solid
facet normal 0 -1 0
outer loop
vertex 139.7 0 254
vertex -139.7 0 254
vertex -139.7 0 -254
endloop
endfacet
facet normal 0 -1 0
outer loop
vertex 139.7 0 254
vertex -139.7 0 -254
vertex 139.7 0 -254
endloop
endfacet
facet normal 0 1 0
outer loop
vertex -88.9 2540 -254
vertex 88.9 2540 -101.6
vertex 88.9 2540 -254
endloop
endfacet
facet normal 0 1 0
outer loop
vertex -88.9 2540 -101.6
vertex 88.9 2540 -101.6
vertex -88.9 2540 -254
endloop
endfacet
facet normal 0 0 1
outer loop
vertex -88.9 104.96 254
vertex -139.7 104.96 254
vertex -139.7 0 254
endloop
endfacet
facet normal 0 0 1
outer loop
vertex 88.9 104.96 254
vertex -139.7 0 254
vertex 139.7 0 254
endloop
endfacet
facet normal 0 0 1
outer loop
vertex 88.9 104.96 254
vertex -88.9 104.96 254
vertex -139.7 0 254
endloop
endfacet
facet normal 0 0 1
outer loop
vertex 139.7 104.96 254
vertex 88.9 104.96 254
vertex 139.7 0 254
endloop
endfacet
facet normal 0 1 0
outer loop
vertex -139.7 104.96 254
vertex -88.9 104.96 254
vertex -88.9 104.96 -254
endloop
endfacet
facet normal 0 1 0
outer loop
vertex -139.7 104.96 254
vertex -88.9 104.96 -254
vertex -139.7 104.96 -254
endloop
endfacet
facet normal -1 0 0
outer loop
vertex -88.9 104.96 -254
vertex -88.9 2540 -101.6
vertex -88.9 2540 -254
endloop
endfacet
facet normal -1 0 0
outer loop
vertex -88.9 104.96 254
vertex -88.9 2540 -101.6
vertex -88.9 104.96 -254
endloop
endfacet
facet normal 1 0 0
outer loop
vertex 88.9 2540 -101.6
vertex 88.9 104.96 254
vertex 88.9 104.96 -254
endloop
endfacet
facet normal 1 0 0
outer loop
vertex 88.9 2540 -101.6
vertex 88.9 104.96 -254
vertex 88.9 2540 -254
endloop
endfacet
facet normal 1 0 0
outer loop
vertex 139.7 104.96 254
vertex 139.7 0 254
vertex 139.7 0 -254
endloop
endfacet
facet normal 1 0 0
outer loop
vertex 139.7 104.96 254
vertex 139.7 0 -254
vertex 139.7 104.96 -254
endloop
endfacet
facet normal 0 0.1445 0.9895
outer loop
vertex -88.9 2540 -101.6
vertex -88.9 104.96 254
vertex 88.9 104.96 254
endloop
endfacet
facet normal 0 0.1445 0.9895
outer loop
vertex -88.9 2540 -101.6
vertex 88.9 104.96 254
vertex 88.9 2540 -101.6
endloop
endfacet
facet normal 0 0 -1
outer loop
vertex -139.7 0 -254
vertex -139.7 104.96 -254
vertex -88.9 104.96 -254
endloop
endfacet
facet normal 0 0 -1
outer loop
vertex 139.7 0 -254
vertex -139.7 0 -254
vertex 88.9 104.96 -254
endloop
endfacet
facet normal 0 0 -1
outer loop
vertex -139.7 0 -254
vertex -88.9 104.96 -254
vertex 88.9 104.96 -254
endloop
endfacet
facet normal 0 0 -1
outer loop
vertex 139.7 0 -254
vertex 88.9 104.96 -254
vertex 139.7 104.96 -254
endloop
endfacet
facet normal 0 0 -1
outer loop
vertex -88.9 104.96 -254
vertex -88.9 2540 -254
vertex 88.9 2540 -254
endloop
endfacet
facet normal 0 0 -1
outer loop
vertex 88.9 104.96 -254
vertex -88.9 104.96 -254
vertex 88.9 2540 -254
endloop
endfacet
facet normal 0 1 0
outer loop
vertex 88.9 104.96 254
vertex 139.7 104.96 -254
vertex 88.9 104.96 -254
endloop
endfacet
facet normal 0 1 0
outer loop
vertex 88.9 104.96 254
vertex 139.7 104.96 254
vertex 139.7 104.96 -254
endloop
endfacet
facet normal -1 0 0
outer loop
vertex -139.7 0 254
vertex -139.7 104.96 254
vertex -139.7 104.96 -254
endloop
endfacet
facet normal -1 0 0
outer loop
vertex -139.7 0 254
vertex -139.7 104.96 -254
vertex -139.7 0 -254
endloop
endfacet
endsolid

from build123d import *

# Parameters (mm, degrees)
BOSS_EXTRUDE1_DEPTH     = 254
CUT_EXTRUDE1_DEPTH      = 140.7
CUT_EXTRUDE1_DEPTH_BACK = 140.7


with BuildPart() as part:
    # Sketch1 → Boss-Extrude1 (new body, symmetric)
    with BuildSketch(Plane.XY):
        Polygon((88.9, 2540), (-88.9, 2540), (-88.9, 104.96042), (-139.7, 104.96042), (-139.7, 0), (139.7, 0), (139.7, 104.96042), (88.9, 104.96042), align=None)
    extrude(amount=BOSS_EXTRUDE1_DEPTH, both=True)

    # Sketch2 → Cut-Extrude1 (cut, two sides)
    with BuildSketch(Plane(origin=(0, 0, 0), x_dir=(0, 0, -1), z_dir=(1, 0, 0))) as cut_extrude1_sk:
        Polygon((-254, 104.96042), (101.6, 2540), (-254, 2540), align=None)
    extrude(amount=CUT_EXTRUDE1_DEPTH, mode=Mode.SUBTRACT)
    extrude(cut_extrude1_sk.sketch, amount=-CUT_EXTRUDE1_DEPTH_BACK, mode=Mode.SUBTRACT)


solid = part.part
